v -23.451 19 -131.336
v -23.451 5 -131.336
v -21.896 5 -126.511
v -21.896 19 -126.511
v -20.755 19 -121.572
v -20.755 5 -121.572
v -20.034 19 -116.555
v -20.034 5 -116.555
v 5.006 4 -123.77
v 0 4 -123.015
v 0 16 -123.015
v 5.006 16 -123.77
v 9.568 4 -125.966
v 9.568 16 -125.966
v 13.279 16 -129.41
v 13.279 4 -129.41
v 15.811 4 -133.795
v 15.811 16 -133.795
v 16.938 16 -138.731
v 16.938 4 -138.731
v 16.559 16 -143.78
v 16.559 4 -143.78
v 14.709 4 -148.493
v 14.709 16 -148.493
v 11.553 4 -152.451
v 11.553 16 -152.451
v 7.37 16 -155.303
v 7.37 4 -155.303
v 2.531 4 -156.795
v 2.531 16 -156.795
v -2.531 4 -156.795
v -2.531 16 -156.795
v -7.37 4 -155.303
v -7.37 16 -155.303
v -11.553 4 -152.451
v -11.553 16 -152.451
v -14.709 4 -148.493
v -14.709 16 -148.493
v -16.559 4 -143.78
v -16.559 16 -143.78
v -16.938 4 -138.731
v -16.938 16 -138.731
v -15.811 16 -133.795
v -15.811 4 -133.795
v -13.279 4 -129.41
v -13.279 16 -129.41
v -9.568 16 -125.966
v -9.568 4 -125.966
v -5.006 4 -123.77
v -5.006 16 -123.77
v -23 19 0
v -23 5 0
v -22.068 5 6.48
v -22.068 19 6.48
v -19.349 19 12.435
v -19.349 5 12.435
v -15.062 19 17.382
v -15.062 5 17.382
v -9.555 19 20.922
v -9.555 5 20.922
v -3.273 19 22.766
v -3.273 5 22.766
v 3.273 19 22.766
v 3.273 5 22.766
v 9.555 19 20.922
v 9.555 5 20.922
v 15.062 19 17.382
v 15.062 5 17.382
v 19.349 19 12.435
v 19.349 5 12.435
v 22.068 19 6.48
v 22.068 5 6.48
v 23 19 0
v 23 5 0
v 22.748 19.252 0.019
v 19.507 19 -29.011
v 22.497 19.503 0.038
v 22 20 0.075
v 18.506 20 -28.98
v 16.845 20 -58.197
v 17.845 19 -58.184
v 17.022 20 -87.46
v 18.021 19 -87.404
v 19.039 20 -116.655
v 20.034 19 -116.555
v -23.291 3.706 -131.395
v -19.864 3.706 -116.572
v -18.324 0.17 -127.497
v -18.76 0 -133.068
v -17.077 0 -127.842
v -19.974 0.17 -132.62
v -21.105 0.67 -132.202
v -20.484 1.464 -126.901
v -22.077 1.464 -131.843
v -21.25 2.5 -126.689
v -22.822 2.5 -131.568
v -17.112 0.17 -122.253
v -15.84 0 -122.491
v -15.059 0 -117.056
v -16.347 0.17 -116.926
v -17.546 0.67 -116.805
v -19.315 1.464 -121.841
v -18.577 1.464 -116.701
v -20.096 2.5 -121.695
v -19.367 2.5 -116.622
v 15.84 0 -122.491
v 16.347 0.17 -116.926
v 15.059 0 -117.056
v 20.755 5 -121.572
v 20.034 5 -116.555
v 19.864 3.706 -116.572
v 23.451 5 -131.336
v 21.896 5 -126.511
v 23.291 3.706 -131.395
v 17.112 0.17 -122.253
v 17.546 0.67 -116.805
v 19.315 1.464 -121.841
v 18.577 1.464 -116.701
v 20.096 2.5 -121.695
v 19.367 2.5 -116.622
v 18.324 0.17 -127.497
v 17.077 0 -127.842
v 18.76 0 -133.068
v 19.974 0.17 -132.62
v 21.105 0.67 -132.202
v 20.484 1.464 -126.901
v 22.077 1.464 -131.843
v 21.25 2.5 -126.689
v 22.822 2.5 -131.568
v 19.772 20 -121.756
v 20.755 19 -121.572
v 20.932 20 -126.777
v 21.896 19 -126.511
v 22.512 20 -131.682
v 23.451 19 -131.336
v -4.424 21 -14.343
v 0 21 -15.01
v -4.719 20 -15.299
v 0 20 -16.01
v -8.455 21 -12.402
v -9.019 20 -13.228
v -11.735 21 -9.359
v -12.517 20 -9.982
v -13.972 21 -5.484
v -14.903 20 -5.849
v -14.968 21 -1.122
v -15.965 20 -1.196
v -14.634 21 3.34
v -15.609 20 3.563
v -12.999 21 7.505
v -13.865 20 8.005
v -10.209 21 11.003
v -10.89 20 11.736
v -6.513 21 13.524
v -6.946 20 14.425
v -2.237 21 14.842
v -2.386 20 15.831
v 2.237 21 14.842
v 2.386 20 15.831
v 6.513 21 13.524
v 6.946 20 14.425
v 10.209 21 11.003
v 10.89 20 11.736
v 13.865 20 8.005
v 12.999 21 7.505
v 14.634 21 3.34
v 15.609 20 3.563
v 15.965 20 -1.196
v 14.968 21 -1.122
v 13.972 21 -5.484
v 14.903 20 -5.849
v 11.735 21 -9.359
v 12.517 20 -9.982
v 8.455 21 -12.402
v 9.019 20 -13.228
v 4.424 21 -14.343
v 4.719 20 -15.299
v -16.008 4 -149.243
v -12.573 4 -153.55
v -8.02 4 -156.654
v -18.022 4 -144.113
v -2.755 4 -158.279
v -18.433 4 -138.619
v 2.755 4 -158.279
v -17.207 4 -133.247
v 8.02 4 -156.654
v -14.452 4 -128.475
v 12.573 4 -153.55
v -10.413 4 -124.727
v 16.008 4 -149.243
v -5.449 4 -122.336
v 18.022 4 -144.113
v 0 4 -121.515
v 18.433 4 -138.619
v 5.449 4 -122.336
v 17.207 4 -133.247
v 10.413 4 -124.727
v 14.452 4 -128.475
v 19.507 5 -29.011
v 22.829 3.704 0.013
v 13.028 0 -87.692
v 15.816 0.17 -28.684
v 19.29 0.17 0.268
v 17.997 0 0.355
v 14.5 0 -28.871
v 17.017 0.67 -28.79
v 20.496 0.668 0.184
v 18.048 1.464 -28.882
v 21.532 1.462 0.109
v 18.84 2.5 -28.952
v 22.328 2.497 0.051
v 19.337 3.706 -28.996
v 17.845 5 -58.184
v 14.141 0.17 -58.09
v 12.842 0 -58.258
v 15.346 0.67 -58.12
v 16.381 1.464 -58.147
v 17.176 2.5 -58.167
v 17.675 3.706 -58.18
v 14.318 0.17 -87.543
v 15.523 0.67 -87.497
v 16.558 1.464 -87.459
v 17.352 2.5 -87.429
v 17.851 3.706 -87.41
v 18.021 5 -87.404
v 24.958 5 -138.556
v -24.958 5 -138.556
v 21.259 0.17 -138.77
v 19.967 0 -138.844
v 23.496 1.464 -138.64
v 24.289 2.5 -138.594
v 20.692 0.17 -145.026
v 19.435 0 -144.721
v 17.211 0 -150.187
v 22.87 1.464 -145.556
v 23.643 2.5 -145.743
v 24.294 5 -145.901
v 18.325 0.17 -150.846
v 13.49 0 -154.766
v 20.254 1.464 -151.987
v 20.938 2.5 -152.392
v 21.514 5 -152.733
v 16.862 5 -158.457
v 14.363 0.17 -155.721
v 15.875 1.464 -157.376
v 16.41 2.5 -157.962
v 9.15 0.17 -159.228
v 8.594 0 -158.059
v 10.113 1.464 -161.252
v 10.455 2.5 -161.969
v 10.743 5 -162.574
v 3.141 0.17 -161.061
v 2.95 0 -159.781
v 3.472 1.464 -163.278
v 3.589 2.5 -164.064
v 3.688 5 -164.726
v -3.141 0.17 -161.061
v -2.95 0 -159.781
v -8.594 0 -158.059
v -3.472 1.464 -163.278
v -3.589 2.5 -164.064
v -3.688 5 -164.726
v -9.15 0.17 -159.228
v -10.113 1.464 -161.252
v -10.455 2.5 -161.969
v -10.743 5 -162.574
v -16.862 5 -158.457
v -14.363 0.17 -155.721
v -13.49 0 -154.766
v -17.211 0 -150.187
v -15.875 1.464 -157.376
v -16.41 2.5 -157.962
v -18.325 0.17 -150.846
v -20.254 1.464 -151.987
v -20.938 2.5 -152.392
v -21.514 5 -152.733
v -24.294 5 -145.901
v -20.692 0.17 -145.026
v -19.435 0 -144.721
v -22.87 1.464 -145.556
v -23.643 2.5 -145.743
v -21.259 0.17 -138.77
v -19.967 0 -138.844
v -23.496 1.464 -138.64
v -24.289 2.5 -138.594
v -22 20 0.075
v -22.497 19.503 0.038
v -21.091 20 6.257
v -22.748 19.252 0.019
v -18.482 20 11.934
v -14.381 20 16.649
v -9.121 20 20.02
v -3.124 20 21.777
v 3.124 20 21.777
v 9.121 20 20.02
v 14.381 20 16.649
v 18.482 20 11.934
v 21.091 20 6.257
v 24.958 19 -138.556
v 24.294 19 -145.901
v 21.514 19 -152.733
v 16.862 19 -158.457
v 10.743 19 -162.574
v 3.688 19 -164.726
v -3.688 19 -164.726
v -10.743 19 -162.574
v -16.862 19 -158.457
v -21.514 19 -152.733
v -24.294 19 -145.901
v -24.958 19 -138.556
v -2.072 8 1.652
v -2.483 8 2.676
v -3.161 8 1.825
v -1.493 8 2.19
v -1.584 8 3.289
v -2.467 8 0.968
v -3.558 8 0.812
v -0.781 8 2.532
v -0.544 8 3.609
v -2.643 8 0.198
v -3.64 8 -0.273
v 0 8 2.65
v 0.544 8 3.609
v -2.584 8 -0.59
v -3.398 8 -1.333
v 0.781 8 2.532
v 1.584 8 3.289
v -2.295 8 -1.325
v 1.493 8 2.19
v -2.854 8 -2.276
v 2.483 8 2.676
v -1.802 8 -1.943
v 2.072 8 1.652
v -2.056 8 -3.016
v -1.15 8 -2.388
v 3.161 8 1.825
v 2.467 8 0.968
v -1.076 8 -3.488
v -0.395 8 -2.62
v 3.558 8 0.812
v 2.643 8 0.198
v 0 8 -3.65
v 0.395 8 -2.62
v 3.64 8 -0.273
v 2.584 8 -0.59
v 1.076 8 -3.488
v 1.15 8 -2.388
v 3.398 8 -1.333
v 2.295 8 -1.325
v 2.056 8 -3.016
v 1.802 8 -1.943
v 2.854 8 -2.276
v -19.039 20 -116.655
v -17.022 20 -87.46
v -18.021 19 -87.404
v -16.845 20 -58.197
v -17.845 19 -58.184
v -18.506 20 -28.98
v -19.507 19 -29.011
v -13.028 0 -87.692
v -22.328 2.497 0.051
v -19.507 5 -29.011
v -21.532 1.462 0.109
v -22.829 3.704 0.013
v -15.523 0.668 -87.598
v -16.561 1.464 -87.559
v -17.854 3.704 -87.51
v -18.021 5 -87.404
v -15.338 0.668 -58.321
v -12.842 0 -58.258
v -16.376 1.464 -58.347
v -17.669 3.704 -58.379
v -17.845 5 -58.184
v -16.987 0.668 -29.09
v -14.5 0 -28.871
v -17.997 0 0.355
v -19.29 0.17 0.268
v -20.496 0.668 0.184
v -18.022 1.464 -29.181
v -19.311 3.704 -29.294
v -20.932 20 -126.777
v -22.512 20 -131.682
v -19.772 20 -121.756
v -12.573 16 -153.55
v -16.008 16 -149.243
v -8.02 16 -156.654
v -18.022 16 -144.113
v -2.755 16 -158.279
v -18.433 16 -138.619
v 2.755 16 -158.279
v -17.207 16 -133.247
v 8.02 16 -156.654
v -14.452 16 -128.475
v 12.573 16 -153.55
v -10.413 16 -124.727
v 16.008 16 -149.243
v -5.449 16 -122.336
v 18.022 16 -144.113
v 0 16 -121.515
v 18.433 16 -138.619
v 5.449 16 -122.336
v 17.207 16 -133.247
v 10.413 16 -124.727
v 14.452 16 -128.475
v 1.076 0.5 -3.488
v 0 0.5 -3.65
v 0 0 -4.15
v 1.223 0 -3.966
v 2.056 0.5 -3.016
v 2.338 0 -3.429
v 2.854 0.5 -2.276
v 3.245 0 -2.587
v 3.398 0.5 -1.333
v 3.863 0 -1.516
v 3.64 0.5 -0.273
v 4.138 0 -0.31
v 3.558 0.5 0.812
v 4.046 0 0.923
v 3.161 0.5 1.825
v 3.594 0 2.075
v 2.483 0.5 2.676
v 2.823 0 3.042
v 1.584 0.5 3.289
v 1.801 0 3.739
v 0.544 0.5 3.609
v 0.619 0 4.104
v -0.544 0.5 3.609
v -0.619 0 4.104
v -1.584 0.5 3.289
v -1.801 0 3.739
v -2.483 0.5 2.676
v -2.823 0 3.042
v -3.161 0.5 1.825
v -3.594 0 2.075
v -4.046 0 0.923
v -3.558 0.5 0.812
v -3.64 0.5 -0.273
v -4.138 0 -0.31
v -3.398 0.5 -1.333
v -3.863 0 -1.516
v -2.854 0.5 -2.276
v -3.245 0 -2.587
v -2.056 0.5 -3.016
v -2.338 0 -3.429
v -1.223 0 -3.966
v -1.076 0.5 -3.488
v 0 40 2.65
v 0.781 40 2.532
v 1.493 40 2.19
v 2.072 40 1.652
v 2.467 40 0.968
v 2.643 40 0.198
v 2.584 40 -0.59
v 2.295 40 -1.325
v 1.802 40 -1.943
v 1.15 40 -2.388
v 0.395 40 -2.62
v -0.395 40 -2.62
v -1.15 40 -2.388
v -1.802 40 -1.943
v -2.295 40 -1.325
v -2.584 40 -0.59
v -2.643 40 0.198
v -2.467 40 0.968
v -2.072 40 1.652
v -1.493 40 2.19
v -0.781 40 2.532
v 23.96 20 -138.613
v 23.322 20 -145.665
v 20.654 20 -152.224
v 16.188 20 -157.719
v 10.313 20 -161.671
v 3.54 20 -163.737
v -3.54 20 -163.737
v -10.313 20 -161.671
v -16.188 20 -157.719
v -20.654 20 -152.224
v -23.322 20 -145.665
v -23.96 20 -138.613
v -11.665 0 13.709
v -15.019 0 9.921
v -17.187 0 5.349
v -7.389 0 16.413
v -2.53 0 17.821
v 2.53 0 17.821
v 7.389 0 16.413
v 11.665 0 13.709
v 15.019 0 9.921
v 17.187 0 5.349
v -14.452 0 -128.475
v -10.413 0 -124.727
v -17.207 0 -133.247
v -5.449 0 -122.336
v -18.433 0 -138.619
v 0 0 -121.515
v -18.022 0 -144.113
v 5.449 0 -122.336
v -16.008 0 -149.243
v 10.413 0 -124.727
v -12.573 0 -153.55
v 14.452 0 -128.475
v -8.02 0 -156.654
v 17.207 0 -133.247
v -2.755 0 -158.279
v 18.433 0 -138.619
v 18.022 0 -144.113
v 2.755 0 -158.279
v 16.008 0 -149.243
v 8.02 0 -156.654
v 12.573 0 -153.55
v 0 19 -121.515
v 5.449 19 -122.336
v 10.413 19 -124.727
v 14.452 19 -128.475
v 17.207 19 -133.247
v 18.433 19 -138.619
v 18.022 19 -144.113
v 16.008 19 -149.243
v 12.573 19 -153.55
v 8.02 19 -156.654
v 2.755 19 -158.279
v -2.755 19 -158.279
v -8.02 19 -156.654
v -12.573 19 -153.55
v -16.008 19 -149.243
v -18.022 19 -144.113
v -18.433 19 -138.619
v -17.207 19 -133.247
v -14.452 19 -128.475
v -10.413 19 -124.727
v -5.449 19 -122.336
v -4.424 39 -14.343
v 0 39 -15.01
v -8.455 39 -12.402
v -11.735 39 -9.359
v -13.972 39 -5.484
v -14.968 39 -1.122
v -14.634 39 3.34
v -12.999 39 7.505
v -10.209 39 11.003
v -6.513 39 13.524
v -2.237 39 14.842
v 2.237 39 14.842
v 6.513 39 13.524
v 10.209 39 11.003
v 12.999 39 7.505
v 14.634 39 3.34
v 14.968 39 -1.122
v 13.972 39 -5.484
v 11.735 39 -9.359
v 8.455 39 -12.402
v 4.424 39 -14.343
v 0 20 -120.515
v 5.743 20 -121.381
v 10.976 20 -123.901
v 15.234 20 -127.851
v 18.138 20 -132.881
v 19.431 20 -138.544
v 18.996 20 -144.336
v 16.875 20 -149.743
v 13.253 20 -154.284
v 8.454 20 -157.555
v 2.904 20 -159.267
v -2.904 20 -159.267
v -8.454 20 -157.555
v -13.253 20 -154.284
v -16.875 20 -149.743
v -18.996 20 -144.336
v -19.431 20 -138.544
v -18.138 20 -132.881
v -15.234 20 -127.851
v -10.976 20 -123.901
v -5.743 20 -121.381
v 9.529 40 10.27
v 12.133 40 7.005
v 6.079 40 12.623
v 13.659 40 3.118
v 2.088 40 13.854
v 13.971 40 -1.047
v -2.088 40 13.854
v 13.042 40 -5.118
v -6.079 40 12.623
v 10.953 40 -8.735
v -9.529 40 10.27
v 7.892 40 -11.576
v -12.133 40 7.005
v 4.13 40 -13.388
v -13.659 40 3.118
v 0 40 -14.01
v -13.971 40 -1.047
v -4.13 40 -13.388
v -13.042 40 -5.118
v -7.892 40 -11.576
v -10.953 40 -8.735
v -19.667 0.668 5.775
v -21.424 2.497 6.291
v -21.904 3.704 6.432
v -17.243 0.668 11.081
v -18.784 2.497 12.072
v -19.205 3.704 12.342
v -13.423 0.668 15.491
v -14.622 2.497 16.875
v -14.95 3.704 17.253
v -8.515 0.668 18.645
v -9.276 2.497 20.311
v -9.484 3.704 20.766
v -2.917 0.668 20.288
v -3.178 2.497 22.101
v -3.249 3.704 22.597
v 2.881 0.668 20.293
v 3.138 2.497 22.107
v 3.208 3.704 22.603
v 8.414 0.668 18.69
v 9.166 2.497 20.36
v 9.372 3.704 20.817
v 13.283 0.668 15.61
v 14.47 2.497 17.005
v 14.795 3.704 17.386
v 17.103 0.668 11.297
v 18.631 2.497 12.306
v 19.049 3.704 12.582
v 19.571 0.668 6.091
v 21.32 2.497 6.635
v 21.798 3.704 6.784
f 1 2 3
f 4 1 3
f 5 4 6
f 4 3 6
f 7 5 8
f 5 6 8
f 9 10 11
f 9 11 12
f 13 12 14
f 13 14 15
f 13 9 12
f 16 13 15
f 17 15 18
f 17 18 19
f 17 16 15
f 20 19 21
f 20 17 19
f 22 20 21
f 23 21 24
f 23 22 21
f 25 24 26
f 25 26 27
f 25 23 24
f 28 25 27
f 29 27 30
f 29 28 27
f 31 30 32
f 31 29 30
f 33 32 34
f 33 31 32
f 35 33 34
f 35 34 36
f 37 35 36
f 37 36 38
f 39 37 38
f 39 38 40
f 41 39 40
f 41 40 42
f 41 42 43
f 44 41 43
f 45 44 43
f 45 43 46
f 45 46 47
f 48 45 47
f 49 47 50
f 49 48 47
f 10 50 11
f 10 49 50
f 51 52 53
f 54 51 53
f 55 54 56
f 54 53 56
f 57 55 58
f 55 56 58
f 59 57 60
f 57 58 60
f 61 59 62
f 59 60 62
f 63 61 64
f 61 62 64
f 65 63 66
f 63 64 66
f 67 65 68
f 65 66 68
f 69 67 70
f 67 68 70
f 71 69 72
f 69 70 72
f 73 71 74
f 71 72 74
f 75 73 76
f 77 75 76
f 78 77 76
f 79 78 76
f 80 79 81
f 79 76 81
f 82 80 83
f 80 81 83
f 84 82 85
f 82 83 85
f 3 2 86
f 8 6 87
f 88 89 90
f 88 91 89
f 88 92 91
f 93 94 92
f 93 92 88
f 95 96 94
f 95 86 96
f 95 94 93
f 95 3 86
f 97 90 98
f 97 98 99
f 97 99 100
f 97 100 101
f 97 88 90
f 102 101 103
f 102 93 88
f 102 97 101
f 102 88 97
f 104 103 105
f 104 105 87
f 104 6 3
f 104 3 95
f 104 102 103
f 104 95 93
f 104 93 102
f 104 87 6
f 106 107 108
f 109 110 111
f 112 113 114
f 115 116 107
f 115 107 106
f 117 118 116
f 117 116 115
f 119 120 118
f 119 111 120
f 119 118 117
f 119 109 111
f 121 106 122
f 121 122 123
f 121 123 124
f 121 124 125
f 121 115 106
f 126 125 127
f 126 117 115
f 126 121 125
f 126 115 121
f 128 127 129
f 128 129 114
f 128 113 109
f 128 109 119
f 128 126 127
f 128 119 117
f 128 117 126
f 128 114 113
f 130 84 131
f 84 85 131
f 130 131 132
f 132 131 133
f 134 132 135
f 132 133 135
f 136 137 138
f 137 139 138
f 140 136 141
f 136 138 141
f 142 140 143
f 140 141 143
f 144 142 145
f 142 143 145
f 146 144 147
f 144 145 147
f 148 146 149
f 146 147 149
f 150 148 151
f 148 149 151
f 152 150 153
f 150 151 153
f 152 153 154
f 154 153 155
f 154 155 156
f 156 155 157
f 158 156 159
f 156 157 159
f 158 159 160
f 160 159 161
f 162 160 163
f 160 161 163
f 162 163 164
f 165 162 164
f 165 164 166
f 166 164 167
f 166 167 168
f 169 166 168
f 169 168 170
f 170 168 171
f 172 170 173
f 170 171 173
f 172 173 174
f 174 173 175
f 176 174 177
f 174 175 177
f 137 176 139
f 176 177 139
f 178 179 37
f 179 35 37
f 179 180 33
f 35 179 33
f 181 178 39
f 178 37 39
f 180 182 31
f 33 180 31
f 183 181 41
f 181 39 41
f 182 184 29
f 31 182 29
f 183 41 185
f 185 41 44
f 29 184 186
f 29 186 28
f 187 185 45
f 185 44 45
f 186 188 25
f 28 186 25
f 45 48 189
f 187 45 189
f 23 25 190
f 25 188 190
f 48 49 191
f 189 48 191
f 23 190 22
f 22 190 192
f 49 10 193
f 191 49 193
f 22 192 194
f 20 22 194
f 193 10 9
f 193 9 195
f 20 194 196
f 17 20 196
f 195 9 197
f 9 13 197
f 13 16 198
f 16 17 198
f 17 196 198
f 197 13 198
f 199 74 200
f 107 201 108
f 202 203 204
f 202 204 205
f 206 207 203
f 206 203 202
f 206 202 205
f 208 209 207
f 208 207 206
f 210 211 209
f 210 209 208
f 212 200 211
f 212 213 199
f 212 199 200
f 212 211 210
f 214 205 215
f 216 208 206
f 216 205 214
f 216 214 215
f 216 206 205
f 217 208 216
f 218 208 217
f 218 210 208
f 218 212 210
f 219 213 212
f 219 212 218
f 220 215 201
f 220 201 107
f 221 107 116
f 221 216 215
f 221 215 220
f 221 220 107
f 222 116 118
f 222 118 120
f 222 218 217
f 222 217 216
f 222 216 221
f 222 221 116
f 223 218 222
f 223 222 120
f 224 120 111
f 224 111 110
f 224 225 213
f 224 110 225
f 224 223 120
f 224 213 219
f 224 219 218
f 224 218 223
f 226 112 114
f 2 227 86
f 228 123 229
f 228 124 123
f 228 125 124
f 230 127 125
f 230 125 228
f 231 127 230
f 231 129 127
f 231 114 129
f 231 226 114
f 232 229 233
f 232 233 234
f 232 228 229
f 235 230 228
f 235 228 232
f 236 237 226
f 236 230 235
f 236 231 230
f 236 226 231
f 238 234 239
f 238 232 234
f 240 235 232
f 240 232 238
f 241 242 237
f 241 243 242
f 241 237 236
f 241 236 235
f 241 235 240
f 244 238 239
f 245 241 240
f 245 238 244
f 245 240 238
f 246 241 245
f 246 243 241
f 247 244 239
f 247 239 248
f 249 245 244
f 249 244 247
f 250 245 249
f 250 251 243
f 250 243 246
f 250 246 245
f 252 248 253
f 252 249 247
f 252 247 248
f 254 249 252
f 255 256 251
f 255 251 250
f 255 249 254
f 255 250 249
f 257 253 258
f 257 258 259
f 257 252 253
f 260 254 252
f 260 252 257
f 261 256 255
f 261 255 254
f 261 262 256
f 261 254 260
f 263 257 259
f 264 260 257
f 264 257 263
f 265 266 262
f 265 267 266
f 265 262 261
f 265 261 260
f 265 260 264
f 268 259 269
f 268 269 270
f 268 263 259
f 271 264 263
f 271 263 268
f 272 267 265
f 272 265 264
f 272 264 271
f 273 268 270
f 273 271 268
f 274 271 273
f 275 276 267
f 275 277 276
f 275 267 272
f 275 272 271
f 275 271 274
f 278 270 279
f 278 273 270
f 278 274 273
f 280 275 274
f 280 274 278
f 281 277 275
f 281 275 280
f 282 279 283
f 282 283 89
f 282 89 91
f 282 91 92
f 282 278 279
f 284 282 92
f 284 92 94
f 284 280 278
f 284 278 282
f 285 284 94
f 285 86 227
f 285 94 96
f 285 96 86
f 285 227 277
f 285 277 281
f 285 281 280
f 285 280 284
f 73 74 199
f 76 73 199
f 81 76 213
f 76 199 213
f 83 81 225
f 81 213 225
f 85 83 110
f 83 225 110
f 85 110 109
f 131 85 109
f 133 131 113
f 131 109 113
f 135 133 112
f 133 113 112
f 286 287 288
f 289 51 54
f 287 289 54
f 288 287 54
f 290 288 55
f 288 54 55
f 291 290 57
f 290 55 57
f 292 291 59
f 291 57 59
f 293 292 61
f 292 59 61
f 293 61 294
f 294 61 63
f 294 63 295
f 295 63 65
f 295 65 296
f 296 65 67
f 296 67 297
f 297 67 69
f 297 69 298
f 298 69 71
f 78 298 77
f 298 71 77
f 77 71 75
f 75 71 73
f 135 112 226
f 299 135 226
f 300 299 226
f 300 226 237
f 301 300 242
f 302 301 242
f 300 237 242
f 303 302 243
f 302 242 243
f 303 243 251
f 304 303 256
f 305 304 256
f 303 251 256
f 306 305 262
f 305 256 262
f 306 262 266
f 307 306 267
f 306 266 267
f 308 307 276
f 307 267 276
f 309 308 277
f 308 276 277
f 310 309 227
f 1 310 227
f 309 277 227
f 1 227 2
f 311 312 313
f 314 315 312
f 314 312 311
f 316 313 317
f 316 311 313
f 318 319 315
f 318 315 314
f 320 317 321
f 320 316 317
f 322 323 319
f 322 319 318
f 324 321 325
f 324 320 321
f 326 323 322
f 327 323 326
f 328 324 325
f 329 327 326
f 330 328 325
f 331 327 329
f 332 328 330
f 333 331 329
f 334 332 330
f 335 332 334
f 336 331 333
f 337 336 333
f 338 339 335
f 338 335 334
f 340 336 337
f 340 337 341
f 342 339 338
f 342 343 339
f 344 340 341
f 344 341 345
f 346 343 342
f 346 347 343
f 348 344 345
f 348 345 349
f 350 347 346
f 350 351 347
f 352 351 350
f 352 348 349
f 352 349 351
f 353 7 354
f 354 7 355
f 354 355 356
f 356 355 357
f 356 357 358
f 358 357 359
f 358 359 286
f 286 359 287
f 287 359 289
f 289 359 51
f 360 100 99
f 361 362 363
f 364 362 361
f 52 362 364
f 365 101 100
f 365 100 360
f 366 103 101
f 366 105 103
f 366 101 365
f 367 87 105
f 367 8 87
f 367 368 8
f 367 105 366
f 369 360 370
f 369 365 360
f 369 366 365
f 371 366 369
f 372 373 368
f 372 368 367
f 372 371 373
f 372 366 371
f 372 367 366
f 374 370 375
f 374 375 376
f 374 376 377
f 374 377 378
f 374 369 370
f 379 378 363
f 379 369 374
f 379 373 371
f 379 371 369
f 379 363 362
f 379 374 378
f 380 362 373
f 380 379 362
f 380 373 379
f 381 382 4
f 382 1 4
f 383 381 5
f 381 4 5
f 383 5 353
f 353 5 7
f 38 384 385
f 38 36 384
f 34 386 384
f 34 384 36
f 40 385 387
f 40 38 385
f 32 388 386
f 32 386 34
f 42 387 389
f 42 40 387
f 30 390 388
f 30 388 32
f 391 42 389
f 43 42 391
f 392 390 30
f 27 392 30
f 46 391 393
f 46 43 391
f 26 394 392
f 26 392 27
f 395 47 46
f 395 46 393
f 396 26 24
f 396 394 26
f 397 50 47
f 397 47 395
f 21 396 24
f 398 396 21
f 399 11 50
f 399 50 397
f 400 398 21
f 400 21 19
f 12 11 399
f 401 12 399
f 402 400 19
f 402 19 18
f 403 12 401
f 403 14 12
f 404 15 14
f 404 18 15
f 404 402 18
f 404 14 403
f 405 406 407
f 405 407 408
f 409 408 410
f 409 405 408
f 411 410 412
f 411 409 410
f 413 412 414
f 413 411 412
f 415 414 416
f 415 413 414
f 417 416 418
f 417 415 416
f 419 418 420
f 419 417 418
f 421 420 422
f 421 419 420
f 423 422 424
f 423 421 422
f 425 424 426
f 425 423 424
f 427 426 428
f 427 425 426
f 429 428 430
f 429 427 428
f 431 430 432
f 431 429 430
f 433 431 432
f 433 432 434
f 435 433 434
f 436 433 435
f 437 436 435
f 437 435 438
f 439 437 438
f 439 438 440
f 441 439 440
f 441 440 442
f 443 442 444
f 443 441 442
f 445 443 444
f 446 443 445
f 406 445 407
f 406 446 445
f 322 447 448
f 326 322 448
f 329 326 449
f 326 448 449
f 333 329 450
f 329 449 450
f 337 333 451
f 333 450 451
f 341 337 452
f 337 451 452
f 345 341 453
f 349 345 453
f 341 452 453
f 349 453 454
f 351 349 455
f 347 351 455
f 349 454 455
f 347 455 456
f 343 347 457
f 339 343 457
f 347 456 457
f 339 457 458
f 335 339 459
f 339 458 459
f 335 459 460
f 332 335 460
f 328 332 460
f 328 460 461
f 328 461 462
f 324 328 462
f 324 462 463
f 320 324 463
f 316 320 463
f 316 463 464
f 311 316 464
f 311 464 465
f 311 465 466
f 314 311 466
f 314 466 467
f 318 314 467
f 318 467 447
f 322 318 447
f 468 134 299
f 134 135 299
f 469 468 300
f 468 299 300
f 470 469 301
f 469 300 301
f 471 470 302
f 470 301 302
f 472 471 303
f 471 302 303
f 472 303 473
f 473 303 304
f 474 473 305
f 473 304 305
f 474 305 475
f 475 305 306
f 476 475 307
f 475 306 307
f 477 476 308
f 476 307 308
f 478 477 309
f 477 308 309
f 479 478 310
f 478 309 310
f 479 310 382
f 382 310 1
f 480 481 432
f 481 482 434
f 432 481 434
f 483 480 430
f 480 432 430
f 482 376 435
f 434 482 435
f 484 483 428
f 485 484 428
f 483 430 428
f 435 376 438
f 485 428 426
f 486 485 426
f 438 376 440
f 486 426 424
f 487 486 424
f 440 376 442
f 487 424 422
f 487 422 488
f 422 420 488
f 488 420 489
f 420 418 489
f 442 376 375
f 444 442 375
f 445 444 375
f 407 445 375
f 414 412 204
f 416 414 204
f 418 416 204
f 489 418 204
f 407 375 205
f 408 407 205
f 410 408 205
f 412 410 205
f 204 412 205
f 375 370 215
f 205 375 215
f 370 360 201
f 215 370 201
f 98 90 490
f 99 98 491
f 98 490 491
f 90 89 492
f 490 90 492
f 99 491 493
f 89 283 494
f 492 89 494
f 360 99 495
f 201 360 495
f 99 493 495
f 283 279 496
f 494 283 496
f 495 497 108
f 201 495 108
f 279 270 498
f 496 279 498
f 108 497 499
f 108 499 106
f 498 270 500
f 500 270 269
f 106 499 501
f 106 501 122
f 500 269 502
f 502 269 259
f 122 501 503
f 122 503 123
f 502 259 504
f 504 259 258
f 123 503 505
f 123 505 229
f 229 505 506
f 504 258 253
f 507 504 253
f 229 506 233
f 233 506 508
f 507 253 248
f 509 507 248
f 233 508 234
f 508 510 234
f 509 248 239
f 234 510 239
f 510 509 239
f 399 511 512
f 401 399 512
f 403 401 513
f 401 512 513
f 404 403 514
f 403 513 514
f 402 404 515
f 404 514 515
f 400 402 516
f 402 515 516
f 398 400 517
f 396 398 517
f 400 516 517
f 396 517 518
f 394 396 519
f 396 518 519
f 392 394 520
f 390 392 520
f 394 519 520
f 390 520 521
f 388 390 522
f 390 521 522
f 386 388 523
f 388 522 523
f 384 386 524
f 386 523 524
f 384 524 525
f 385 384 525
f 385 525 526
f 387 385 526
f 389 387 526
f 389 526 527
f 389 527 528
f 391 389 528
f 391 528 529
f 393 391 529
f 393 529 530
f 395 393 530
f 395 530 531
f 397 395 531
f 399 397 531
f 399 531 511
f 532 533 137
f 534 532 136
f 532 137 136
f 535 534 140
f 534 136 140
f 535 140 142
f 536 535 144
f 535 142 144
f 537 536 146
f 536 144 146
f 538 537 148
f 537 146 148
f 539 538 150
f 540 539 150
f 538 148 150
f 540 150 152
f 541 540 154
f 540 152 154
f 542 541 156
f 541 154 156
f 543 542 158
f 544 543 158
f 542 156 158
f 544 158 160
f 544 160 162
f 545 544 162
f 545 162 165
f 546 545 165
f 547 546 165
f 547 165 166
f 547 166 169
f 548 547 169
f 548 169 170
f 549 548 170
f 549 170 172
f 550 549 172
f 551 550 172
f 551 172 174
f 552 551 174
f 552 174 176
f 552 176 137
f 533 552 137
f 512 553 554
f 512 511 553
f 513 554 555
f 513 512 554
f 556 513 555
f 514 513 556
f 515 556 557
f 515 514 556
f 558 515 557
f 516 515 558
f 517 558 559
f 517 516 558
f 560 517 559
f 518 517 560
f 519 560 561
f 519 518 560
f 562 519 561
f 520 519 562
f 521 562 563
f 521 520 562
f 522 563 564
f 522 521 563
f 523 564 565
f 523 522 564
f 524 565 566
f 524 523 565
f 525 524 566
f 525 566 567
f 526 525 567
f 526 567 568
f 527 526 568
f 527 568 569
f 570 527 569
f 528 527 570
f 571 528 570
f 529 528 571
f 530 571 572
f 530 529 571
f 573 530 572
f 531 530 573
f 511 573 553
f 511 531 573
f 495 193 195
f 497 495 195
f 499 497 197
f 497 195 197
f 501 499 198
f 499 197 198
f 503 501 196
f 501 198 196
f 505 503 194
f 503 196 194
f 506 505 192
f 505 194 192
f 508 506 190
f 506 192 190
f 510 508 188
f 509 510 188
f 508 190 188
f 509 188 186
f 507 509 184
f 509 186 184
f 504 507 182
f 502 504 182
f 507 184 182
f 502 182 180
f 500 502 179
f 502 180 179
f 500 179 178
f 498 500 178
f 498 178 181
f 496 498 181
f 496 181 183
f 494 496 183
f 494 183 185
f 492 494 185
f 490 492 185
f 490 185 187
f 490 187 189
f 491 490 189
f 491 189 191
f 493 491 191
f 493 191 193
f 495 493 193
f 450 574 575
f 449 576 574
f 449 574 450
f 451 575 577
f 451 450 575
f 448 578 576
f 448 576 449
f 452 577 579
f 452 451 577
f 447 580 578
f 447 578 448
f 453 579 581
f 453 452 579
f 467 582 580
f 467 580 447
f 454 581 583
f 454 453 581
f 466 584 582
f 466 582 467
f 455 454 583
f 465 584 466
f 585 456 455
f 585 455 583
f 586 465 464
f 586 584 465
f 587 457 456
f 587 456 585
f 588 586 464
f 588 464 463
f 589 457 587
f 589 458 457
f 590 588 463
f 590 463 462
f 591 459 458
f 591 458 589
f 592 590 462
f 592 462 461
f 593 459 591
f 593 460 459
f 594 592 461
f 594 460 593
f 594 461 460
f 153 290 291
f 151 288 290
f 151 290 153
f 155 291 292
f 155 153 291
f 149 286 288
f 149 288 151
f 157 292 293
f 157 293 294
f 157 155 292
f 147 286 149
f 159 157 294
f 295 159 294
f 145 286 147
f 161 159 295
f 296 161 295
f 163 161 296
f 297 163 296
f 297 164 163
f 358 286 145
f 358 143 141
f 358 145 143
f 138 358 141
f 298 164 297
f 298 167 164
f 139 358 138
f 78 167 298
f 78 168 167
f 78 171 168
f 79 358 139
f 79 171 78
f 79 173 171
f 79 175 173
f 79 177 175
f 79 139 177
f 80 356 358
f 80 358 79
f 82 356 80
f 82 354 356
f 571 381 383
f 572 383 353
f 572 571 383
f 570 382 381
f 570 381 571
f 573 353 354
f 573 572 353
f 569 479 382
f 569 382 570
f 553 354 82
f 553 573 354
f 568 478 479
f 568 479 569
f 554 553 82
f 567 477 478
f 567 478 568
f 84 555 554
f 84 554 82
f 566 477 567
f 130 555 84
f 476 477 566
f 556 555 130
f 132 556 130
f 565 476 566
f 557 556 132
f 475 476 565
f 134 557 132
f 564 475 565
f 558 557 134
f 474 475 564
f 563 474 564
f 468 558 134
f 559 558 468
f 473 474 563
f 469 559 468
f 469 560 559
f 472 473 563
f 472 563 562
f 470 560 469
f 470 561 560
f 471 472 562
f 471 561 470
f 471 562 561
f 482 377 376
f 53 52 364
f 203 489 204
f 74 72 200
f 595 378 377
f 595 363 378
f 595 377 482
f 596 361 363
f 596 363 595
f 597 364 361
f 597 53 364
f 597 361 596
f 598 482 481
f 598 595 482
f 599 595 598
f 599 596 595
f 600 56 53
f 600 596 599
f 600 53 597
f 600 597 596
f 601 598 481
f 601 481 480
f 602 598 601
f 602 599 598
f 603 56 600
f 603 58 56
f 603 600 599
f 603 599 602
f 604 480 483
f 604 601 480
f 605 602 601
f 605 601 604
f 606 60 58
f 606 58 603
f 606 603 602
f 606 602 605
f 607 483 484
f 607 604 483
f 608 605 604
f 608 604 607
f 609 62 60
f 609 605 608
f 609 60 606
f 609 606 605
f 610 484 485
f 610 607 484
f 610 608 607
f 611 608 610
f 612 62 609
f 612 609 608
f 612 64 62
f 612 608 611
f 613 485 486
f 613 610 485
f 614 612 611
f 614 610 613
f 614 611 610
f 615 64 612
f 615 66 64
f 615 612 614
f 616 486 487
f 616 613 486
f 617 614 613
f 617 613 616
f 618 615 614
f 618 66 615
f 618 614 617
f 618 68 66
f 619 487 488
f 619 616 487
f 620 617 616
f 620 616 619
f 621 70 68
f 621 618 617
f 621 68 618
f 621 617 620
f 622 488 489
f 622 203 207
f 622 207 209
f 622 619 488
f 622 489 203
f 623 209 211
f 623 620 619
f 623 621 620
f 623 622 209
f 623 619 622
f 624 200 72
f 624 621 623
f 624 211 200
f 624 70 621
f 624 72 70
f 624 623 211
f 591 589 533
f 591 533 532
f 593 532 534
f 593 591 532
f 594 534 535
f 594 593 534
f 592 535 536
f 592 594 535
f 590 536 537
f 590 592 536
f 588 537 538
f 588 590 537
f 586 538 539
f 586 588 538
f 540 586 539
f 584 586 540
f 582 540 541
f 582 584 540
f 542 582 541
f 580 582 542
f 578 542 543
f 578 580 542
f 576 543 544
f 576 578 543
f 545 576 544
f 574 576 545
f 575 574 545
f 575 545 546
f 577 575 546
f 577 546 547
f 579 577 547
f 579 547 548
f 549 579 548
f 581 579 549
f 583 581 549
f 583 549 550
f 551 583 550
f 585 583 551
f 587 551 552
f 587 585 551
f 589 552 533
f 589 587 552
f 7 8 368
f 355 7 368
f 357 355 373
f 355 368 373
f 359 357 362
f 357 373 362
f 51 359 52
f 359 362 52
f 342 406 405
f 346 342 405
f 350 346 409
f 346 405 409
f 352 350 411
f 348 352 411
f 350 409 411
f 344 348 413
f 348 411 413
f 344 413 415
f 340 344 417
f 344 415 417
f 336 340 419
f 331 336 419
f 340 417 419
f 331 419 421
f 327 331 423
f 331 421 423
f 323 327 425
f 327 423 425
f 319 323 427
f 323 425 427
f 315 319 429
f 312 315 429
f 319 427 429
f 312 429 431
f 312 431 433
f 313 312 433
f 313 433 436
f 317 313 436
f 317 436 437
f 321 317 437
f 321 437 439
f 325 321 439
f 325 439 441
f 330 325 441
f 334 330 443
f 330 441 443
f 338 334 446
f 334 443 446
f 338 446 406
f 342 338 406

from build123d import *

# Parameters (mm, degrees)
BOSS_EXTRUDE1_DEPTH      = 20
SKETCH2_R                = 15.01
BOSS_EXTRUDE2_DEPTH      = 20
CHAMFER1_SIZE            = 1
SKETCH3_R                = 18.485
CUT_EXTRUDE1_DEPTH       = 20
CHAMFER3_SIZE            = 1
SKETCH5_R                = 2.65
CUT_EXTRUDE2_DEPTH       = 40
FILLET3_R                = 5
SKETCH6_R                = 3.65
CUT_EXTRUDE3_DEPTH       = 8
CHAMFER4_SIZE            = 0.5
BOSS_EXTRUDE3_DEPTH      = 6
BOSS_EXTRUDE3_DEPTH_BACK = 6
SKETCH7_R                = 18.485000000000003
SKETCH7_R_2              = 16.984999999999996


with BuildPart() as part:
    # Sketch1 → Boss-Extrude1 (new body)
    with BuildSketch(Plane(origin=(0, 0, 0), x_dir=(1, 0, 0), z_dir=(0, 1, 0))):
        with BuildLine():
            ThreePointArc((-23, 0), (1.41e-15, -22.999999999999982), (23, 0))
            ThreePointArc((23, 0), (17.845208734768505, 58.18386045047181), (20.033890701411753, 116.55459936267802))
            ThreePointArc((20.033890701411753, 116.55459936267802), (21.27316153822275, 124.05347023326534), (23.45051159720983, 131.33550314045155))
            ThreePointArc((23.45051159720983, 131.33550314045155), (-2.067e-14, 165.00000000000006), (-23.45051159720983, 131.3355031404515))
            ThreePointArc((-23.45051159720983, 131.3355031404515), (-21.27316153822273, 124.05347023326526), (-20.033890701411725, 116.55459936267786))
            ThreePointArc((-20.033890701411725, 116.55459936267786), (-17.845208734768505, 58.1838604504716), (-23, 0))
        make_face()
    extrude(amount=BOSS_EXTRUDE1_DEPTH)

    # Sketch2 → Boss-Extrude2 (add)
    with BuildSketch(Plane(origin=(0, 20, 0), x_dir=(1, 0, 0), z_dir=(0, 1, 0))):
        with Locations(Location((0, 0, 0), (0, 0, 90))):
            Circle(SKETCH2_R)
    extrude(amount=BOSS_EXTRUDE2_DEPTH)

    # Chamfer1
    chamfer1_edges = [part.edges().sort_by_distance(p)[0] for p in [
        (-2.76e-15, 40, 15.01),
    ]]
    chamfer(chamfer1_edges, length=CHAMFER1_SIZE)

    # Sketch3 → Cut-Extrude1 (cut)
    with BuildSketch(Plane(origin=(0, 20, 0), x_dir=(1, 0, 0), z_dir=(0, 1, 0))):
        with Locations(Location((0, 140.00000000000009, 0), (0, 0, 270))):
            Circle(SKETCH3_R)
    extrude(amount=-CUT_EXTRUDE1_DEPTH, mode=Mode.SUBTRACT)

    # Chamfer3
    # the kernel refuses this chamfer: 1 mm, written as the material it adds along each edge
    with BuildSketch(Plane(origin=(0, 20, 0), x_dir=(6e-17, 0, -1), z_dir=(1, 0, 6e-17))) as chamfer3_piece_1:
        Polygon((15.01, CHAMFER3_SIZE), (15.01 + CHAMFER3_SIZE, 0), (15.01, 0), align=None)
    revolve(axis=Axis((0, 20, 0), (0, 1, 0)))
    # the kernel refuses this chamfer: 1 mm, written as the material it takes off along each edge
    with BuildSketch(Plane(origin=(-79.73173943051358, 20, -110.54071067753486), x_dir=(0.9380204638883933, 0, -0.3465798743819428), z_dir=(-0.3465798743819428, 0, -0.9380204638883933))) as chamfer3_2_piece_1:
        Polygon((60.00000000000017 + CHAMFER3_SIZE, 0), (60.00000000000017, CHAMFER3_SIZE), (60.00000000000017, 0), align=None)
    revolve(axis=Axis((-79.73173943051358, 20, -110.54071067753486), (0, -1, 0)), revolution_arc=14.525766875036835, mode=Mode.SUBTRACT)
    with BuildSketch(Plane(origin=(-482.16572850262514, 20, -70.00000000000004), x_dir=(0.9949641454850282, 0, -0.1002314780857173), z_dir=(-0.1002314780857173, 0, -0.9949641454850282))) as chamfer3_2_piece_2:
        Polygon((464.4708454051196 + CHAMFER3_SIZE, 0), (464.4708454051196, CHAMFER3_SIZE), (464.4708454051196, 0), align=None)
    revolve(axis=Axis((-482.16572850262514, 20, -70.00000000000004), (0, -1, 0)), revolution_arc=14.737763084908373, mode=Mode.SUBTRACT)
    with BuildSketch(Plane(origin=(0, 20, -1.599e-14), x_dir=(-0.9937354343699007, 0, -0.11175816067592001), z_dir=(0.11175816067592001, 0, -0.9937354343699007))) as chamfer3_2_piece_3:
        Polygon((23.000000000000004 - CHAMFER3_SIZE, 0), (23.000000000000004, -CHAMFER3_SIZE), (23.000000000000004, 0), align=None)
    revolve(axis=Axis((0, 20, -1.599e-14), (0, 1, 0)), revolution_arc=192.83335153216495, mode=Mode.SUBTRACT)
    with BuildSketch(Plane(origin=(482.16572850261997, 20, -69.99999999999986), x_dir=(-0.9877285445231084, 0, 0.15618041597544133), z_dir=(0.15618041597544133, 0, 0.9877285445231084))) as chamfer3_2_piece_4:
        Polygon((464.4708454051149 + CHAMFER3_SIZE, 0), (464.47084540511446, CHAMFER3_SIZE), (464.4708454051149, 0), align=None)
    revolve(axis=Axis((482.16572850261997, 20, -69.99999999999986), (0, -1, 0)), revolution_arc=14.737763084908554, mode=Mode.SUBTRACT)
    with BuildSketch(Plane(origin=(0, 20, -140.00000000000009), x_dir=(-1.8e-16, 0, 1), z_dir=(-1, 0, -1.8e-16))) as chamfer3_2_piece_5:
        Polygon((18.485 + CHAMFER3_SIZE, 0), (18.485, -CHAMFER3_SIZE), (18.485, 0), align=None)
    revolve(axis=Axis((0, 20, -140.00000000000009), (0, 1, 0)), mode=Mode.SUBTRACT)
    with BuildSketch(Plane(origin=(79.7317394305139, 20, -110.54071067753493), x_dir=(-0.9949641454850281, 0, -0.10023147808571735), z_dir=(-0.10023147808571735, 0, 0.9949641454850281))) as chamfer3_2_piece_6:
        Polygon((60.000000000000455 + CHAMFER3_SIZE, 0), (60.000000000000455, CHAMFER3_SIZE), (60.000000000000455, 0), align=None)
    revolve(axis=Axis((79.7317394305139, 20, -110.54071067753493), (0, -1, 0)), revolution_arc=14.525766875036666, mode=Mode.SUBTRACT)
    with BuildSketch(Plane(origin=(9.77e-15, 20, -140.00000000000006), x_dir=(0.9380204638883942, 0, 0.3465798743819405), z_dir=(-0.3465798743819405, 0, 0.9380204638883942))) as chamfer3_2_piece_7:
        Polygon((24.999999999999982 - CHAMFER3_SIZE, 0), (24.999999999999982, -CHAMFER3_SIZE), (24.999999999999982, 0), align=None)
    revolve(axis=Axis((9.77e-15, 20, -140.00000000000006), (0, 1, 0)), revolution_arc=220.55653408148345, mode=Mode.SUBTRACT)

    # Sketch5 → Cut-Extrude2 (cut)
    with BuildSketch(Plane(origin=(0, 40, 0), x_dir=(1, 0, 0), z_dir=(0, 1, 0))):
        with Locations(Location((0, 0, 0), (0, 0, 270))):
            Circle(SKETCH5_R)
    extrude(amount=-CUT_EXTRUDE2_DEPTH, mode=Mode.SUBTRACT)

    # Fillet3
    # the kernel refuses this fillet: 5 mm, written as the material it takes off along each edge
    with BuildSketch(Plane(origin=(482.16572850261997, 0, -69.99999999999986), x_dir=(-0.9868985080370148, 0, 0.1613422909045059), z_dir=(0.1613422909045059, 0, 0.9868985080370148))) as fillet3_piece_1:
        with BuildLine():
            CenterArc((464.4708454051144 + FILLET3_R, -FILLET3_R), FILLET3_R, 89.99999999999935, 90.00000000000068)
            Line((464.4708454051144 + FILLET3_R, 8.9e-16), (464.4708454051144 + FILLET3_R, FILLET3_R * 0.02))
            Line((464.4708454051144 + FILLET3_R, FILLET3_R * 0.02), (464.4708454051144 - FILLET3_R * 0.02, FILLET3_R * 0.02))
            Line((464.4708454051144 - FILLET3_R * 0.02, FILLET3_R * 0.02), (464.4708454051144 - FILLET3_R * 0.02, -FILLET3_R))
            Line((464.4708454051144 - FILLET3_R * 0.02, -FILLET3_R), (464.4708454051144, -FILLET3_R))
        make_face()
    revolve(axis=Axis((482.16572850261997, 0, -69.99999999999986), (0, -1, 0)), revolution_arc=15.03731633345655, mode=Mode.SUBTRACT)
    with BuildSketch(Plane(origin=(0, 0, -1.599e-14), x_dir=(-0.9763879588864252, 0, -0.21602442857603077), z_dir=(0.21602442857603077, 0, -0.9763879588864252))) as fillet3_piece_2:
        with BuildLine():
            CenterArc((23 - FILLET3_R, FILLET3_R), FILLET3_R, 269.99999999999994, 90.00000000000006)
            Line((23 - FILLET3_R, -8.9e-16), (23 - FILLET3_R, -FILLET3_R * 0.02))
            Line((23 - FILLET3_R, -FILLET3_R * 0.02), (23 + FILLET3_R * 0.02, -FILLET3_R * 0.02))
            Line((23 + FILLET3_R * 0.02, -FILLET3_R * 0.02), (23 + FILLET3_R * 0.02, FILLET3_R))
            Line((23 + FILLET3_R * 0.02, FILLET3_R), (23.000000000000004, FILLET3_R))
        make_face()
    revolve(axis=Axis((0, 0, -1.599e-14), (0, 1, 0)), revolution_arc=204.95127041750123, mode=Mode.SUBTRACT)
    with BuildSketch(Plane(origin=(-482.16572850262514, 0, -70.00000000000004), x_dir=(0.9949641454850282, 0, -0.1002314780857173), z_dir=(-0.1002314780857173, 0, -0.9949641454850282))) as fillet3_piece_3:
        with BuildLine():
            CenterArc((464.4708454051196 + FILLET3_R, -FILLET3_R), FILLET3_R, 90, 90)
            Line((464.4708454051196 + FILLET3_R, 8.9e-16), (464.4708454051196 + FILLET3_R, FILLET3_R * 0.02))
            Line((464.4708454051196 + FILLET3_R, FILLET3_R * 0.02), (464.4708454051196 - FILLET3_R * 0.02, FILLET3_R * 0.02))
            Line((464.4708454051196 - FILLET3_R * 0.02, FILLET3_R * 0.02), (464.4708454051196 - FILLET3_R * 0.02, -FILLET3_R))
            Line((464.4708454051196 - FILLET3_R * 0.02, -FILLET3_R), (464.4708454051196, -FILLET3_R))
        make_face()
    revolve(axis=Axis((-482.16572850262514, 0, -70.00000000000004), (0, -1, 0)), revolution_arc=15.037316333456364, mode=Mode.SUBTRACT)
    with BuildSketch(Plane(origin=(-79.73173943051358, 0, -110.54071067753486), x_dir=(0.9380204638883933, 0, -0.3465798743819428), z_dir=(-0.3465798743819428, 0, -0.9380204638883933))) as fillet3_piece_4:
        with BuildLine():
            CenterArc((60.00000000000017 + FILLET3_R, -FILLET3_R), FILLET3_R, 90, 90)
            Line((60.00000000000017 + FILLET3_R, 8.9e-16), (60.00000000000017 + FILLET3_R, FILLET3_R * 0.02))
            Line((60.00000000000017 + FILLET3_R, FILLET3_R * 0.02), (60.00000000000017 - FILLET3_R * 0.02, FILLET3_R * 0.02))
            Line((60.00000000000017 - FILLET3_R * 0.02, FILLET3_R * 0.02), (60.00000000000017 - FILLET3_R * 0.02, -FILLET3_R))
            Line((60.00000000000017 - FILLET3_R * 0.02, -FILLET3_R), (60.00000000000018, -FILLET3_R))
        make_face()
    revolve(axis=Axis((-79.73173943051358, 0, -110.54071067753486), (0, -1, 0)), revolution_arc=14.525766875036835, mode=Mode.SUBTRACT)
    with BuildSketch(Plane(origin=(9.77e-15, 0, -140.00000000000006), x_dir=(0.9380204638883942, 0, 0.3465798743819405), z_dir=(-0.3465798743819405, 0, 0.9380204638883942))) as fillet3_piece_5:
        with BuildLine():
            CenterArc((24.999999999999982 - FILLET3_R, FILLET3_R), FILLET3_R, 270, 90)
            Line((24.999999999999982 - FILLET3_R, -8.9e-16), (24.999999999999982 - FILLET3_R, -FILLET3_R * 0.02))
            Line((24.999999999999982 - FILLET3_R, -FILLET3_R * 0.02), (24.999999999999982 + FILLET3_R * 0.02, -FILLET3_R * 0.02))
            Line((24.999999999999982 + FILLET3_R * 0.02, -FILLET3_R * 0.02), (24.999999999999982 + FILLET3_R * 0.02, FILLET3_R))
            Line((24.999999999999982 + FILLET3_R * 0.02, FILLET3_R), (24.999999999999986, FILLET3_R))
        make_face()
    revolve(axis=Axis((9.77e-15, 0, -140.00000000000006), (0, 1, 0)), revolution_arc=220.55653408148345, mode=Mode.SUBTRACT)
    with BuildSketch(Plane(origin=(79.7317394305139, 0, -110.54071067753493), x_dir=(-0.9949641454850281, 0, -0.10023147808571735), z_dir=(-0.10023147808571735, 0, 0.9949641454850281))) as fillet3_piece_6:
        with BuildLine():
            CenterArc((60.000000000000455 + FILLET3_R, -FILLET3_R), FILLET3_R, 90, 90)
            Line((60.000000000000455 + FILLET3_R, 8.9e-16), (60.000000000000455 + FILLET3_R, FILLET3_R * 0.02))
            Line((60.000000000000455 + FILLET3_R, FILLET3_R * 0.02), (60.000000000000455 - FILLET3_R * 0.02, FILLET3_R * 0.02))
            Line((60.000000000000455 - FILLET3_R * 0.02, FILLET3_R * 0.02), (60.000000000000455 - FILLET3_R * 0.02, -FILLET3_R))
            Line((60.000000000000455 - FILLET3_R * 0.02, -FILLET3_R), (60.000000000000455, -FILLET3_R))
        make_face()
    revolve(axis=Axis((79.7317394305139, 0, -110.54071067753493), (0, -1, 0)), revolution_arc=14.525766875036666, mode=Mode.SUBTRACT)

    # Sketch6 → Cut-Extrude3 (cut)
    with BuildSketch(Plane.XZ):
        with Locations(Location((0, 0, 0), (0, 0, 270))):
            Circle(SKETCH6_R)
    extrude(amount=-CUT_EXTRUDE3_DEPTH, mode=Mode.SUBTRACT)

    # Chamfer4
    chamfer4_edges = [part.edges().sort_by_distance(p)[0] for p in [
        (1.12e-15, 0, 3.65),
    ]]
    chamfer(chamfer4_edges, length=CHAMFER4_SIZE)

    # Sketch7 → Boss-Extrude3 (add, two sides: drawn at the far end of the back side and taken through both)
    with BuildSketch(Plane(origin=(0, 10, 0), x_dir=(1, 0, 0), z_dir=(0, 1, 0)).offset(-BOSS_EXTRUDE3_DEPTH_BACK)):
        with Locations(Location((0, 140.00000000000009, 0), (0, 0, 270))):
            Circle(SKETCH7_R)
        with Locations(Location((0, 140.00000000000009, 0), (0, 0, 270))):
            Circle(SKETCH7_R_2, mode=Mode.SUBTRACT)
    extrude(amount=BOSS_EXTRUDE3_DEPTH + BOSS_EXTRUDE3_DEPTH_BACK)


solid = part.part
